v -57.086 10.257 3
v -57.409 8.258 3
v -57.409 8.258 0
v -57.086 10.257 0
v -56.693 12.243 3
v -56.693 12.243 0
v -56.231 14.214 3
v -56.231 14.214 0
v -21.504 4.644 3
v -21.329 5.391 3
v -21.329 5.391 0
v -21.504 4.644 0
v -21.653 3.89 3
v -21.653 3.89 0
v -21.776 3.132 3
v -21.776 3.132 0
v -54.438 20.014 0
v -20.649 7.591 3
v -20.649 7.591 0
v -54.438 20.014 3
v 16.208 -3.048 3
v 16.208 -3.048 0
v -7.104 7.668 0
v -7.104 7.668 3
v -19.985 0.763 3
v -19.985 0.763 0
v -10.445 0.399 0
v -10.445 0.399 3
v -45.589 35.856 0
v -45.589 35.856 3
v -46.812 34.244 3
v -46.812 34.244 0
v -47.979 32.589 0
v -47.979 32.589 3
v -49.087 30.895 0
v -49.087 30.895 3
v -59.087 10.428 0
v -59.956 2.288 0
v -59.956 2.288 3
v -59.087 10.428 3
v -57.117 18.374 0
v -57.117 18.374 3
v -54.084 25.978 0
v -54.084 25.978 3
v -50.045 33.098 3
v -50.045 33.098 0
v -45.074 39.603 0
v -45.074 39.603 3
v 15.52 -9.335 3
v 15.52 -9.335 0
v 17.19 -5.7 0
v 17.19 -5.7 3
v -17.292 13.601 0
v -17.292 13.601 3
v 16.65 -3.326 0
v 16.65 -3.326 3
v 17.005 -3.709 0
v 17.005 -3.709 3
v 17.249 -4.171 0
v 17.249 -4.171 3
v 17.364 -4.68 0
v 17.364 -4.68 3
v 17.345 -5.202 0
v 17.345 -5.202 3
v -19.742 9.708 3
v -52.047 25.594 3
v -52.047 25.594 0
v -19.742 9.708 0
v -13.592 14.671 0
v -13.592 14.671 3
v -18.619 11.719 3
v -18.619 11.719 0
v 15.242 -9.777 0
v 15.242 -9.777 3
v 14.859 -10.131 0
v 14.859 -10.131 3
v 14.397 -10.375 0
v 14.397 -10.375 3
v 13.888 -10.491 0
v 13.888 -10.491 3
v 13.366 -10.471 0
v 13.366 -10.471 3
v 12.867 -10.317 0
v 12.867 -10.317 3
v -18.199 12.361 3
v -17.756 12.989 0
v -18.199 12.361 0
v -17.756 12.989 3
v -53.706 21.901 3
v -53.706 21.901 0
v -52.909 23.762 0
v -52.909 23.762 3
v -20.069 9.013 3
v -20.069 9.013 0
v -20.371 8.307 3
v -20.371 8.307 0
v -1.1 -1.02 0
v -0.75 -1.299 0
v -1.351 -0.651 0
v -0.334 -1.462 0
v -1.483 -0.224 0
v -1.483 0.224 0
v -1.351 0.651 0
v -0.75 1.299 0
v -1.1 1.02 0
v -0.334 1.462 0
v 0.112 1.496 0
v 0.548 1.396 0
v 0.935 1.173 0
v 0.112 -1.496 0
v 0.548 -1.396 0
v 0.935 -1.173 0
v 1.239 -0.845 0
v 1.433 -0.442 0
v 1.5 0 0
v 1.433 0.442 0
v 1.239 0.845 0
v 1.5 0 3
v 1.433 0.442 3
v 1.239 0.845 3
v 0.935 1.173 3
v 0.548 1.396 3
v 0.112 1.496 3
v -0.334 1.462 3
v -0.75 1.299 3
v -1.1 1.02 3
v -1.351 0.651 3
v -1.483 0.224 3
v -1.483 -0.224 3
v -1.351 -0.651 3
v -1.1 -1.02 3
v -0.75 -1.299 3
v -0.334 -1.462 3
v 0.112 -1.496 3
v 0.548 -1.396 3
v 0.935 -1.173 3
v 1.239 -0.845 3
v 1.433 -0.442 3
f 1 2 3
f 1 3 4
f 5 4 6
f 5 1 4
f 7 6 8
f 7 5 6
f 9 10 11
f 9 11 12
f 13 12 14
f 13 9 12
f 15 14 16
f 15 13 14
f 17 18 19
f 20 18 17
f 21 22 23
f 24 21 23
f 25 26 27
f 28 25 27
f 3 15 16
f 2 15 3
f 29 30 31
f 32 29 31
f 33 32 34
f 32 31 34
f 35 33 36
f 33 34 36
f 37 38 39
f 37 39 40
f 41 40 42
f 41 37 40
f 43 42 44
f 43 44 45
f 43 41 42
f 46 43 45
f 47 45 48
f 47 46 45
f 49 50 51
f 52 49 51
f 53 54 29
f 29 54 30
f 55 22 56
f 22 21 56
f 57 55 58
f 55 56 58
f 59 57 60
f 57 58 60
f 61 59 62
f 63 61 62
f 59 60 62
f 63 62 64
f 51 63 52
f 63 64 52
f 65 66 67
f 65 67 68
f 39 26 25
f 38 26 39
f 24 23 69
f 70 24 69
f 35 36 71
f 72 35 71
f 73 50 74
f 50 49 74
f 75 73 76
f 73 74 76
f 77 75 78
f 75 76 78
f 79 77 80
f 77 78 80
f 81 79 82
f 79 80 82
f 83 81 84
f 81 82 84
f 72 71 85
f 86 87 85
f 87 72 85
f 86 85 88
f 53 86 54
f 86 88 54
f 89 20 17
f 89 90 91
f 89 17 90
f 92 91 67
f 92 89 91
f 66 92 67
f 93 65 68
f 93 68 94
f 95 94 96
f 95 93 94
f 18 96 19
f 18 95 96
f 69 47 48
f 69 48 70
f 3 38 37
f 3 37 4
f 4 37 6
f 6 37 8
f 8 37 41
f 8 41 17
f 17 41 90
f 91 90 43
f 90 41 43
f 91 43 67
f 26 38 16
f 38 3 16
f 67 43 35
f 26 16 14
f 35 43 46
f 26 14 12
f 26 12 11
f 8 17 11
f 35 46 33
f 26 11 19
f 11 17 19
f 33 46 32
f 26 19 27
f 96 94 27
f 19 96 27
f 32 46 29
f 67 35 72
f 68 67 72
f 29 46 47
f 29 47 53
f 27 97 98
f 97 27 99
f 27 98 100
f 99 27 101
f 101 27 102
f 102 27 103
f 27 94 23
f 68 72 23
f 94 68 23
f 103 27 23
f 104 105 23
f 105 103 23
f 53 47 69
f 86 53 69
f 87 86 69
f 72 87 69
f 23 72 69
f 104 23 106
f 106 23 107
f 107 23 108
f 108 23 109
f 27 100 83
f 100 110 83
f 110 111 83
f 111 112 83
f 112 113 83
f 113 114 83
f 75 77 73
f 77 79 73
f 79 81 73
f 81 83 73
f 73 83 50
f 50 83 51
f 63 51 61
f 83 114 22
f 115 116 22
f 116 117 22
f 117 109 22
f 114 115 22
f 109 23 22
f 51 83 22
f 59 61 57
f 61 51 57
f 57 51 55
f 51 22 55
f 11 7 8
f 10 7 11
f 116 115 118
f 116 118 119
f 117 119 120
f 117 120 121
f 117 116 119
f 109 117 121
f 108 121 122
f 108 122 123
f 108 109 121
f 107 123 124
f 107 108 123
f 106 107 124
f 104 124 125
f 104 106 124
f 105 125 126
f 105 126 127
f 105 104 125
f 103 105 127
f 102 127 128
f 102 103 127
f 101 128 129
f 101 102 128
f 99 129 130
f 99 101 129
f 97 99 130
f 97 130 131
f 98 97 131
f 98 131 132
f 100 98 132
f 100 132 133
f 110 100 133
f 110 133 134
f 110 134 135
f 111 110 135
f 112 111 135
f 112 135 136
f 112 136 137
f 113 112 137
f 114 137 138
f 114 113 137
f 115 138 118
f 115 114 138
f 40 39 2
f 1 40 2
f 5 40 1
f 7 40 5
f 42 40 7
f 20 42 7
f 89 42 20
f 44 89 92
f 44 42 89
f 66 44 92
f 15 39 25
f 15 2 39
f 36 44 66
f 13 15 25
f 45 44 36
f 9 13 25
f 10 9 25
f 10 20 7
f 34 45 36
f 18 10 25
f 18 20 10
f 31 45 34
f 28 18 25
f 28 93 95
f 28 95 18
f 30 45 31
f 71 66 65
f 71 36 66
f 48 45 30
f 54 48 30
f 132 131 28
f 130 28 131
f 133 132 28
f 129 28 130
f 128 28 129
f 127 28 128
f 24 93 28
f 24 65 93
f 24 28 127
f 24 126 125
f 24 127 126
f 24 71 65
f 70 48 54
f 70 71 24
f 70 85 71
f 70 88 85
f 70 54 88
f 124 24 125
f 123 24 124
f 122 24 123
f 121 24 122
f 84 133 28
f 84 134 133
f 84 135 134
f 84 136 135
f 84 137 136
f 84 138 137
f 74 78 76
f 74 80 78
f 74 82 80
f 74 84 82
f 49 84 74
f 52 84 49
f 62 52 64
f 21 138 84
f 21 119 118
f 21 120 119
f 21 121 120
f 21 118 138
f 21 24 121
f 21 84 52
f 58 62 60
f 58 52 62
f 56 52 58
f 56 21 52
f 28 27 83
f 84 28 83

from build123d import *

# Parameters (mm, degrees)
BOSS_EXTRUDE2_DEPTH = 3
SKETCH1_8_R         = 1.5
BOSS_EXTRUDE5_DEPTH = 3
FILLET1_R           = 2
CUT_EXTRUDE1_REACH  = 73.918


with BuildPart() as part:
    # Sketch1 → Boss-Extrude2 (new body)
    with BuildSketch(Plane.XY):
        with BuildLine():
            Line((-19.985447982, 0.762803358), (-59.956343946, 2.288410074))
            ThreePointArc((-59.956343946, 2.288410074), (-55.730717245, 22.228071336), (-45.073672701, 39.602576043))
            Line((-45.073672701, 39.602576043), (-13.592462366, 14.67122922))
            ThreePointArc((-13.592462366, 14.67122922), (-18.172234131, 8.352838241), (-19.985447982, 0.762803358))
        make_face()
    extrude(amount=BOSS_EXTRUDE2_DEPTH)

    # Sketch1<8> → Boss-Extrude5 (add)
    with BuildSketch(Plane.XY):
        with BuildLine():
            ThreePointArc((-19.475648091, 4.549629811), (-19.821189154, 2.668419106), (-19.985447982, 0.762803358))
            Line((-19.985447982, 0.762803358), (-10.444898468, 0.398660247))
            Line((-10.444898468, 0.398660247), (14.68444307, -11.152001243))
            Line((14.68444307, -11.152001243), (18.025578366, -3.883107591))
            Line((18.025578366, -3.883107591), (-7.103763171, 7.667553899))
            Line((-7.103763171, 7.667553899), (-13.592462366, 14.67122922))
            ThreePointArc((-13.592462366, 14.67122922), (-14.931769674, 13.305722619), (-16.134512795, 11.818523464))
            ThreePointArc((-16.134512795, 11.818523464), (-18.172234131, 8.352838241), (-19.475648091, 4.549629811))
        make_face()
        Circle(SKETCH1_8_R, mode=Mode.SUBTRACT)
    extrude(amount=BOSS_EXTRUDE5_DEPTH)

    # Fillet1
    fillet1_edges = [part.edges().sort_by_distance(p)[0] for p in [
        (18.025578366, -3.883107591, 1.5),
        (14.68444307, -11.152001243, 1.5),
    ]]
    fillet(fillet1_edges, radius=FILLET1_R)

    # Sketch2 → Cut-Extrude1 (cut, up to next)
    with BuildSketch(Plane.XY.offset(3), mode=Mode.PRIVATE) as cut_extrude1_sk1:
        with BuildLine():
            Line((-52.047329922, 25.59444174), (-19.74209066, 9.708236522))
            ThreePointArc((-19.74209066, 9.708236522), (-20.223124653, 8.661710528), (-20.648728467, 7.591443388))
            Line((-20.648728467, 7.591443388), (-54.437556866, 20.013805296))
            ThreePointArc((-54.437556866, 20.013805296), (-53.315510448, 22.835418665), (-52.047329922, 25.59444174))
        make_face()
    cut_extrude1_tool1 = extrude(cut_extrude1_sk1.sketch, amount=-CUT_EXTRUDE1_REACH, mode=Mode.PRIVATE) & part.part
    # Sketch2 → Cut-Extrude1 (cut, up to next)
    with BuildSketch(Plane.XY.offset(3), mode=Mode.PRIVATE) as cut_extrude1_sk2:
        with BuildLine():
            Line((-56.231354546, 14.213893413), (-21.329134483, 5.391476812))
            ThreePointArc((-21.329134483, 5.391476812), (-21.58207174, 4.267807331), (-21.775854038, 3.132440087))
            Line((-21.775854038, 3.132440087), (-57.409069737, 8.25825114))
            ThreePointArc((-57.409069737, 8.25825114), (-56.898189132, 11.251492055), (-56.231354546, 14.213893413))
        make_face()
    cut_extrude1_tool2 = extrude(cut_extrude1_sk2.sketch, amount=-CUT_EXTRUDE1_REACH, mode=Mode.PRIVATE) & part.part
    # Sketch2 → Cut-Extrude1 (cut, up to next)
    with BuildSketch(Plane.XY.offset(3), mode=Mode.PRIVATE) as cut_extrude1_sk3:
        with BuildLine():
            Line((-49.08686154, 30.894660124), (-18.619154377, 11.718664185))
            ThreePointArc((-18.619154377, 11.718664185), (-17.980329977, 12.677055412), (-17.292222743, 13.600699711))
            Line((-17.292222743, 13.600699711), (-45.58858723, 35.856390146))
            ThreePointArc((-45.58858723, 35.856390146), (-47.402688122, 33.421327903), (-49.08686154, 30.894660124))
        make_face()
    cut_extrude1_tool3 = extrude(cut_extrude1_sk3.sketch, amount=-CUT_EXTRUDE1_REACH, mode=Mode.PRIVATE) & part.part
    add(cut_extrude1_tool1.solids().sort_by_distance((-39.233314, 16.803912, 3))[0], mode=Mode.SUBTRACT)
    add(cut_extrude1_tool2.solids().sort_by_distance((-41.869702, 8.279642, 3))[0], mode=Mode.SUBTRACT)
    add(cut_extrude1_tool3.solids().sort_by_distance((-34.882242, 24.593771, 3))[0], mode=Mode.SUBTRACT)


solid = part.part
